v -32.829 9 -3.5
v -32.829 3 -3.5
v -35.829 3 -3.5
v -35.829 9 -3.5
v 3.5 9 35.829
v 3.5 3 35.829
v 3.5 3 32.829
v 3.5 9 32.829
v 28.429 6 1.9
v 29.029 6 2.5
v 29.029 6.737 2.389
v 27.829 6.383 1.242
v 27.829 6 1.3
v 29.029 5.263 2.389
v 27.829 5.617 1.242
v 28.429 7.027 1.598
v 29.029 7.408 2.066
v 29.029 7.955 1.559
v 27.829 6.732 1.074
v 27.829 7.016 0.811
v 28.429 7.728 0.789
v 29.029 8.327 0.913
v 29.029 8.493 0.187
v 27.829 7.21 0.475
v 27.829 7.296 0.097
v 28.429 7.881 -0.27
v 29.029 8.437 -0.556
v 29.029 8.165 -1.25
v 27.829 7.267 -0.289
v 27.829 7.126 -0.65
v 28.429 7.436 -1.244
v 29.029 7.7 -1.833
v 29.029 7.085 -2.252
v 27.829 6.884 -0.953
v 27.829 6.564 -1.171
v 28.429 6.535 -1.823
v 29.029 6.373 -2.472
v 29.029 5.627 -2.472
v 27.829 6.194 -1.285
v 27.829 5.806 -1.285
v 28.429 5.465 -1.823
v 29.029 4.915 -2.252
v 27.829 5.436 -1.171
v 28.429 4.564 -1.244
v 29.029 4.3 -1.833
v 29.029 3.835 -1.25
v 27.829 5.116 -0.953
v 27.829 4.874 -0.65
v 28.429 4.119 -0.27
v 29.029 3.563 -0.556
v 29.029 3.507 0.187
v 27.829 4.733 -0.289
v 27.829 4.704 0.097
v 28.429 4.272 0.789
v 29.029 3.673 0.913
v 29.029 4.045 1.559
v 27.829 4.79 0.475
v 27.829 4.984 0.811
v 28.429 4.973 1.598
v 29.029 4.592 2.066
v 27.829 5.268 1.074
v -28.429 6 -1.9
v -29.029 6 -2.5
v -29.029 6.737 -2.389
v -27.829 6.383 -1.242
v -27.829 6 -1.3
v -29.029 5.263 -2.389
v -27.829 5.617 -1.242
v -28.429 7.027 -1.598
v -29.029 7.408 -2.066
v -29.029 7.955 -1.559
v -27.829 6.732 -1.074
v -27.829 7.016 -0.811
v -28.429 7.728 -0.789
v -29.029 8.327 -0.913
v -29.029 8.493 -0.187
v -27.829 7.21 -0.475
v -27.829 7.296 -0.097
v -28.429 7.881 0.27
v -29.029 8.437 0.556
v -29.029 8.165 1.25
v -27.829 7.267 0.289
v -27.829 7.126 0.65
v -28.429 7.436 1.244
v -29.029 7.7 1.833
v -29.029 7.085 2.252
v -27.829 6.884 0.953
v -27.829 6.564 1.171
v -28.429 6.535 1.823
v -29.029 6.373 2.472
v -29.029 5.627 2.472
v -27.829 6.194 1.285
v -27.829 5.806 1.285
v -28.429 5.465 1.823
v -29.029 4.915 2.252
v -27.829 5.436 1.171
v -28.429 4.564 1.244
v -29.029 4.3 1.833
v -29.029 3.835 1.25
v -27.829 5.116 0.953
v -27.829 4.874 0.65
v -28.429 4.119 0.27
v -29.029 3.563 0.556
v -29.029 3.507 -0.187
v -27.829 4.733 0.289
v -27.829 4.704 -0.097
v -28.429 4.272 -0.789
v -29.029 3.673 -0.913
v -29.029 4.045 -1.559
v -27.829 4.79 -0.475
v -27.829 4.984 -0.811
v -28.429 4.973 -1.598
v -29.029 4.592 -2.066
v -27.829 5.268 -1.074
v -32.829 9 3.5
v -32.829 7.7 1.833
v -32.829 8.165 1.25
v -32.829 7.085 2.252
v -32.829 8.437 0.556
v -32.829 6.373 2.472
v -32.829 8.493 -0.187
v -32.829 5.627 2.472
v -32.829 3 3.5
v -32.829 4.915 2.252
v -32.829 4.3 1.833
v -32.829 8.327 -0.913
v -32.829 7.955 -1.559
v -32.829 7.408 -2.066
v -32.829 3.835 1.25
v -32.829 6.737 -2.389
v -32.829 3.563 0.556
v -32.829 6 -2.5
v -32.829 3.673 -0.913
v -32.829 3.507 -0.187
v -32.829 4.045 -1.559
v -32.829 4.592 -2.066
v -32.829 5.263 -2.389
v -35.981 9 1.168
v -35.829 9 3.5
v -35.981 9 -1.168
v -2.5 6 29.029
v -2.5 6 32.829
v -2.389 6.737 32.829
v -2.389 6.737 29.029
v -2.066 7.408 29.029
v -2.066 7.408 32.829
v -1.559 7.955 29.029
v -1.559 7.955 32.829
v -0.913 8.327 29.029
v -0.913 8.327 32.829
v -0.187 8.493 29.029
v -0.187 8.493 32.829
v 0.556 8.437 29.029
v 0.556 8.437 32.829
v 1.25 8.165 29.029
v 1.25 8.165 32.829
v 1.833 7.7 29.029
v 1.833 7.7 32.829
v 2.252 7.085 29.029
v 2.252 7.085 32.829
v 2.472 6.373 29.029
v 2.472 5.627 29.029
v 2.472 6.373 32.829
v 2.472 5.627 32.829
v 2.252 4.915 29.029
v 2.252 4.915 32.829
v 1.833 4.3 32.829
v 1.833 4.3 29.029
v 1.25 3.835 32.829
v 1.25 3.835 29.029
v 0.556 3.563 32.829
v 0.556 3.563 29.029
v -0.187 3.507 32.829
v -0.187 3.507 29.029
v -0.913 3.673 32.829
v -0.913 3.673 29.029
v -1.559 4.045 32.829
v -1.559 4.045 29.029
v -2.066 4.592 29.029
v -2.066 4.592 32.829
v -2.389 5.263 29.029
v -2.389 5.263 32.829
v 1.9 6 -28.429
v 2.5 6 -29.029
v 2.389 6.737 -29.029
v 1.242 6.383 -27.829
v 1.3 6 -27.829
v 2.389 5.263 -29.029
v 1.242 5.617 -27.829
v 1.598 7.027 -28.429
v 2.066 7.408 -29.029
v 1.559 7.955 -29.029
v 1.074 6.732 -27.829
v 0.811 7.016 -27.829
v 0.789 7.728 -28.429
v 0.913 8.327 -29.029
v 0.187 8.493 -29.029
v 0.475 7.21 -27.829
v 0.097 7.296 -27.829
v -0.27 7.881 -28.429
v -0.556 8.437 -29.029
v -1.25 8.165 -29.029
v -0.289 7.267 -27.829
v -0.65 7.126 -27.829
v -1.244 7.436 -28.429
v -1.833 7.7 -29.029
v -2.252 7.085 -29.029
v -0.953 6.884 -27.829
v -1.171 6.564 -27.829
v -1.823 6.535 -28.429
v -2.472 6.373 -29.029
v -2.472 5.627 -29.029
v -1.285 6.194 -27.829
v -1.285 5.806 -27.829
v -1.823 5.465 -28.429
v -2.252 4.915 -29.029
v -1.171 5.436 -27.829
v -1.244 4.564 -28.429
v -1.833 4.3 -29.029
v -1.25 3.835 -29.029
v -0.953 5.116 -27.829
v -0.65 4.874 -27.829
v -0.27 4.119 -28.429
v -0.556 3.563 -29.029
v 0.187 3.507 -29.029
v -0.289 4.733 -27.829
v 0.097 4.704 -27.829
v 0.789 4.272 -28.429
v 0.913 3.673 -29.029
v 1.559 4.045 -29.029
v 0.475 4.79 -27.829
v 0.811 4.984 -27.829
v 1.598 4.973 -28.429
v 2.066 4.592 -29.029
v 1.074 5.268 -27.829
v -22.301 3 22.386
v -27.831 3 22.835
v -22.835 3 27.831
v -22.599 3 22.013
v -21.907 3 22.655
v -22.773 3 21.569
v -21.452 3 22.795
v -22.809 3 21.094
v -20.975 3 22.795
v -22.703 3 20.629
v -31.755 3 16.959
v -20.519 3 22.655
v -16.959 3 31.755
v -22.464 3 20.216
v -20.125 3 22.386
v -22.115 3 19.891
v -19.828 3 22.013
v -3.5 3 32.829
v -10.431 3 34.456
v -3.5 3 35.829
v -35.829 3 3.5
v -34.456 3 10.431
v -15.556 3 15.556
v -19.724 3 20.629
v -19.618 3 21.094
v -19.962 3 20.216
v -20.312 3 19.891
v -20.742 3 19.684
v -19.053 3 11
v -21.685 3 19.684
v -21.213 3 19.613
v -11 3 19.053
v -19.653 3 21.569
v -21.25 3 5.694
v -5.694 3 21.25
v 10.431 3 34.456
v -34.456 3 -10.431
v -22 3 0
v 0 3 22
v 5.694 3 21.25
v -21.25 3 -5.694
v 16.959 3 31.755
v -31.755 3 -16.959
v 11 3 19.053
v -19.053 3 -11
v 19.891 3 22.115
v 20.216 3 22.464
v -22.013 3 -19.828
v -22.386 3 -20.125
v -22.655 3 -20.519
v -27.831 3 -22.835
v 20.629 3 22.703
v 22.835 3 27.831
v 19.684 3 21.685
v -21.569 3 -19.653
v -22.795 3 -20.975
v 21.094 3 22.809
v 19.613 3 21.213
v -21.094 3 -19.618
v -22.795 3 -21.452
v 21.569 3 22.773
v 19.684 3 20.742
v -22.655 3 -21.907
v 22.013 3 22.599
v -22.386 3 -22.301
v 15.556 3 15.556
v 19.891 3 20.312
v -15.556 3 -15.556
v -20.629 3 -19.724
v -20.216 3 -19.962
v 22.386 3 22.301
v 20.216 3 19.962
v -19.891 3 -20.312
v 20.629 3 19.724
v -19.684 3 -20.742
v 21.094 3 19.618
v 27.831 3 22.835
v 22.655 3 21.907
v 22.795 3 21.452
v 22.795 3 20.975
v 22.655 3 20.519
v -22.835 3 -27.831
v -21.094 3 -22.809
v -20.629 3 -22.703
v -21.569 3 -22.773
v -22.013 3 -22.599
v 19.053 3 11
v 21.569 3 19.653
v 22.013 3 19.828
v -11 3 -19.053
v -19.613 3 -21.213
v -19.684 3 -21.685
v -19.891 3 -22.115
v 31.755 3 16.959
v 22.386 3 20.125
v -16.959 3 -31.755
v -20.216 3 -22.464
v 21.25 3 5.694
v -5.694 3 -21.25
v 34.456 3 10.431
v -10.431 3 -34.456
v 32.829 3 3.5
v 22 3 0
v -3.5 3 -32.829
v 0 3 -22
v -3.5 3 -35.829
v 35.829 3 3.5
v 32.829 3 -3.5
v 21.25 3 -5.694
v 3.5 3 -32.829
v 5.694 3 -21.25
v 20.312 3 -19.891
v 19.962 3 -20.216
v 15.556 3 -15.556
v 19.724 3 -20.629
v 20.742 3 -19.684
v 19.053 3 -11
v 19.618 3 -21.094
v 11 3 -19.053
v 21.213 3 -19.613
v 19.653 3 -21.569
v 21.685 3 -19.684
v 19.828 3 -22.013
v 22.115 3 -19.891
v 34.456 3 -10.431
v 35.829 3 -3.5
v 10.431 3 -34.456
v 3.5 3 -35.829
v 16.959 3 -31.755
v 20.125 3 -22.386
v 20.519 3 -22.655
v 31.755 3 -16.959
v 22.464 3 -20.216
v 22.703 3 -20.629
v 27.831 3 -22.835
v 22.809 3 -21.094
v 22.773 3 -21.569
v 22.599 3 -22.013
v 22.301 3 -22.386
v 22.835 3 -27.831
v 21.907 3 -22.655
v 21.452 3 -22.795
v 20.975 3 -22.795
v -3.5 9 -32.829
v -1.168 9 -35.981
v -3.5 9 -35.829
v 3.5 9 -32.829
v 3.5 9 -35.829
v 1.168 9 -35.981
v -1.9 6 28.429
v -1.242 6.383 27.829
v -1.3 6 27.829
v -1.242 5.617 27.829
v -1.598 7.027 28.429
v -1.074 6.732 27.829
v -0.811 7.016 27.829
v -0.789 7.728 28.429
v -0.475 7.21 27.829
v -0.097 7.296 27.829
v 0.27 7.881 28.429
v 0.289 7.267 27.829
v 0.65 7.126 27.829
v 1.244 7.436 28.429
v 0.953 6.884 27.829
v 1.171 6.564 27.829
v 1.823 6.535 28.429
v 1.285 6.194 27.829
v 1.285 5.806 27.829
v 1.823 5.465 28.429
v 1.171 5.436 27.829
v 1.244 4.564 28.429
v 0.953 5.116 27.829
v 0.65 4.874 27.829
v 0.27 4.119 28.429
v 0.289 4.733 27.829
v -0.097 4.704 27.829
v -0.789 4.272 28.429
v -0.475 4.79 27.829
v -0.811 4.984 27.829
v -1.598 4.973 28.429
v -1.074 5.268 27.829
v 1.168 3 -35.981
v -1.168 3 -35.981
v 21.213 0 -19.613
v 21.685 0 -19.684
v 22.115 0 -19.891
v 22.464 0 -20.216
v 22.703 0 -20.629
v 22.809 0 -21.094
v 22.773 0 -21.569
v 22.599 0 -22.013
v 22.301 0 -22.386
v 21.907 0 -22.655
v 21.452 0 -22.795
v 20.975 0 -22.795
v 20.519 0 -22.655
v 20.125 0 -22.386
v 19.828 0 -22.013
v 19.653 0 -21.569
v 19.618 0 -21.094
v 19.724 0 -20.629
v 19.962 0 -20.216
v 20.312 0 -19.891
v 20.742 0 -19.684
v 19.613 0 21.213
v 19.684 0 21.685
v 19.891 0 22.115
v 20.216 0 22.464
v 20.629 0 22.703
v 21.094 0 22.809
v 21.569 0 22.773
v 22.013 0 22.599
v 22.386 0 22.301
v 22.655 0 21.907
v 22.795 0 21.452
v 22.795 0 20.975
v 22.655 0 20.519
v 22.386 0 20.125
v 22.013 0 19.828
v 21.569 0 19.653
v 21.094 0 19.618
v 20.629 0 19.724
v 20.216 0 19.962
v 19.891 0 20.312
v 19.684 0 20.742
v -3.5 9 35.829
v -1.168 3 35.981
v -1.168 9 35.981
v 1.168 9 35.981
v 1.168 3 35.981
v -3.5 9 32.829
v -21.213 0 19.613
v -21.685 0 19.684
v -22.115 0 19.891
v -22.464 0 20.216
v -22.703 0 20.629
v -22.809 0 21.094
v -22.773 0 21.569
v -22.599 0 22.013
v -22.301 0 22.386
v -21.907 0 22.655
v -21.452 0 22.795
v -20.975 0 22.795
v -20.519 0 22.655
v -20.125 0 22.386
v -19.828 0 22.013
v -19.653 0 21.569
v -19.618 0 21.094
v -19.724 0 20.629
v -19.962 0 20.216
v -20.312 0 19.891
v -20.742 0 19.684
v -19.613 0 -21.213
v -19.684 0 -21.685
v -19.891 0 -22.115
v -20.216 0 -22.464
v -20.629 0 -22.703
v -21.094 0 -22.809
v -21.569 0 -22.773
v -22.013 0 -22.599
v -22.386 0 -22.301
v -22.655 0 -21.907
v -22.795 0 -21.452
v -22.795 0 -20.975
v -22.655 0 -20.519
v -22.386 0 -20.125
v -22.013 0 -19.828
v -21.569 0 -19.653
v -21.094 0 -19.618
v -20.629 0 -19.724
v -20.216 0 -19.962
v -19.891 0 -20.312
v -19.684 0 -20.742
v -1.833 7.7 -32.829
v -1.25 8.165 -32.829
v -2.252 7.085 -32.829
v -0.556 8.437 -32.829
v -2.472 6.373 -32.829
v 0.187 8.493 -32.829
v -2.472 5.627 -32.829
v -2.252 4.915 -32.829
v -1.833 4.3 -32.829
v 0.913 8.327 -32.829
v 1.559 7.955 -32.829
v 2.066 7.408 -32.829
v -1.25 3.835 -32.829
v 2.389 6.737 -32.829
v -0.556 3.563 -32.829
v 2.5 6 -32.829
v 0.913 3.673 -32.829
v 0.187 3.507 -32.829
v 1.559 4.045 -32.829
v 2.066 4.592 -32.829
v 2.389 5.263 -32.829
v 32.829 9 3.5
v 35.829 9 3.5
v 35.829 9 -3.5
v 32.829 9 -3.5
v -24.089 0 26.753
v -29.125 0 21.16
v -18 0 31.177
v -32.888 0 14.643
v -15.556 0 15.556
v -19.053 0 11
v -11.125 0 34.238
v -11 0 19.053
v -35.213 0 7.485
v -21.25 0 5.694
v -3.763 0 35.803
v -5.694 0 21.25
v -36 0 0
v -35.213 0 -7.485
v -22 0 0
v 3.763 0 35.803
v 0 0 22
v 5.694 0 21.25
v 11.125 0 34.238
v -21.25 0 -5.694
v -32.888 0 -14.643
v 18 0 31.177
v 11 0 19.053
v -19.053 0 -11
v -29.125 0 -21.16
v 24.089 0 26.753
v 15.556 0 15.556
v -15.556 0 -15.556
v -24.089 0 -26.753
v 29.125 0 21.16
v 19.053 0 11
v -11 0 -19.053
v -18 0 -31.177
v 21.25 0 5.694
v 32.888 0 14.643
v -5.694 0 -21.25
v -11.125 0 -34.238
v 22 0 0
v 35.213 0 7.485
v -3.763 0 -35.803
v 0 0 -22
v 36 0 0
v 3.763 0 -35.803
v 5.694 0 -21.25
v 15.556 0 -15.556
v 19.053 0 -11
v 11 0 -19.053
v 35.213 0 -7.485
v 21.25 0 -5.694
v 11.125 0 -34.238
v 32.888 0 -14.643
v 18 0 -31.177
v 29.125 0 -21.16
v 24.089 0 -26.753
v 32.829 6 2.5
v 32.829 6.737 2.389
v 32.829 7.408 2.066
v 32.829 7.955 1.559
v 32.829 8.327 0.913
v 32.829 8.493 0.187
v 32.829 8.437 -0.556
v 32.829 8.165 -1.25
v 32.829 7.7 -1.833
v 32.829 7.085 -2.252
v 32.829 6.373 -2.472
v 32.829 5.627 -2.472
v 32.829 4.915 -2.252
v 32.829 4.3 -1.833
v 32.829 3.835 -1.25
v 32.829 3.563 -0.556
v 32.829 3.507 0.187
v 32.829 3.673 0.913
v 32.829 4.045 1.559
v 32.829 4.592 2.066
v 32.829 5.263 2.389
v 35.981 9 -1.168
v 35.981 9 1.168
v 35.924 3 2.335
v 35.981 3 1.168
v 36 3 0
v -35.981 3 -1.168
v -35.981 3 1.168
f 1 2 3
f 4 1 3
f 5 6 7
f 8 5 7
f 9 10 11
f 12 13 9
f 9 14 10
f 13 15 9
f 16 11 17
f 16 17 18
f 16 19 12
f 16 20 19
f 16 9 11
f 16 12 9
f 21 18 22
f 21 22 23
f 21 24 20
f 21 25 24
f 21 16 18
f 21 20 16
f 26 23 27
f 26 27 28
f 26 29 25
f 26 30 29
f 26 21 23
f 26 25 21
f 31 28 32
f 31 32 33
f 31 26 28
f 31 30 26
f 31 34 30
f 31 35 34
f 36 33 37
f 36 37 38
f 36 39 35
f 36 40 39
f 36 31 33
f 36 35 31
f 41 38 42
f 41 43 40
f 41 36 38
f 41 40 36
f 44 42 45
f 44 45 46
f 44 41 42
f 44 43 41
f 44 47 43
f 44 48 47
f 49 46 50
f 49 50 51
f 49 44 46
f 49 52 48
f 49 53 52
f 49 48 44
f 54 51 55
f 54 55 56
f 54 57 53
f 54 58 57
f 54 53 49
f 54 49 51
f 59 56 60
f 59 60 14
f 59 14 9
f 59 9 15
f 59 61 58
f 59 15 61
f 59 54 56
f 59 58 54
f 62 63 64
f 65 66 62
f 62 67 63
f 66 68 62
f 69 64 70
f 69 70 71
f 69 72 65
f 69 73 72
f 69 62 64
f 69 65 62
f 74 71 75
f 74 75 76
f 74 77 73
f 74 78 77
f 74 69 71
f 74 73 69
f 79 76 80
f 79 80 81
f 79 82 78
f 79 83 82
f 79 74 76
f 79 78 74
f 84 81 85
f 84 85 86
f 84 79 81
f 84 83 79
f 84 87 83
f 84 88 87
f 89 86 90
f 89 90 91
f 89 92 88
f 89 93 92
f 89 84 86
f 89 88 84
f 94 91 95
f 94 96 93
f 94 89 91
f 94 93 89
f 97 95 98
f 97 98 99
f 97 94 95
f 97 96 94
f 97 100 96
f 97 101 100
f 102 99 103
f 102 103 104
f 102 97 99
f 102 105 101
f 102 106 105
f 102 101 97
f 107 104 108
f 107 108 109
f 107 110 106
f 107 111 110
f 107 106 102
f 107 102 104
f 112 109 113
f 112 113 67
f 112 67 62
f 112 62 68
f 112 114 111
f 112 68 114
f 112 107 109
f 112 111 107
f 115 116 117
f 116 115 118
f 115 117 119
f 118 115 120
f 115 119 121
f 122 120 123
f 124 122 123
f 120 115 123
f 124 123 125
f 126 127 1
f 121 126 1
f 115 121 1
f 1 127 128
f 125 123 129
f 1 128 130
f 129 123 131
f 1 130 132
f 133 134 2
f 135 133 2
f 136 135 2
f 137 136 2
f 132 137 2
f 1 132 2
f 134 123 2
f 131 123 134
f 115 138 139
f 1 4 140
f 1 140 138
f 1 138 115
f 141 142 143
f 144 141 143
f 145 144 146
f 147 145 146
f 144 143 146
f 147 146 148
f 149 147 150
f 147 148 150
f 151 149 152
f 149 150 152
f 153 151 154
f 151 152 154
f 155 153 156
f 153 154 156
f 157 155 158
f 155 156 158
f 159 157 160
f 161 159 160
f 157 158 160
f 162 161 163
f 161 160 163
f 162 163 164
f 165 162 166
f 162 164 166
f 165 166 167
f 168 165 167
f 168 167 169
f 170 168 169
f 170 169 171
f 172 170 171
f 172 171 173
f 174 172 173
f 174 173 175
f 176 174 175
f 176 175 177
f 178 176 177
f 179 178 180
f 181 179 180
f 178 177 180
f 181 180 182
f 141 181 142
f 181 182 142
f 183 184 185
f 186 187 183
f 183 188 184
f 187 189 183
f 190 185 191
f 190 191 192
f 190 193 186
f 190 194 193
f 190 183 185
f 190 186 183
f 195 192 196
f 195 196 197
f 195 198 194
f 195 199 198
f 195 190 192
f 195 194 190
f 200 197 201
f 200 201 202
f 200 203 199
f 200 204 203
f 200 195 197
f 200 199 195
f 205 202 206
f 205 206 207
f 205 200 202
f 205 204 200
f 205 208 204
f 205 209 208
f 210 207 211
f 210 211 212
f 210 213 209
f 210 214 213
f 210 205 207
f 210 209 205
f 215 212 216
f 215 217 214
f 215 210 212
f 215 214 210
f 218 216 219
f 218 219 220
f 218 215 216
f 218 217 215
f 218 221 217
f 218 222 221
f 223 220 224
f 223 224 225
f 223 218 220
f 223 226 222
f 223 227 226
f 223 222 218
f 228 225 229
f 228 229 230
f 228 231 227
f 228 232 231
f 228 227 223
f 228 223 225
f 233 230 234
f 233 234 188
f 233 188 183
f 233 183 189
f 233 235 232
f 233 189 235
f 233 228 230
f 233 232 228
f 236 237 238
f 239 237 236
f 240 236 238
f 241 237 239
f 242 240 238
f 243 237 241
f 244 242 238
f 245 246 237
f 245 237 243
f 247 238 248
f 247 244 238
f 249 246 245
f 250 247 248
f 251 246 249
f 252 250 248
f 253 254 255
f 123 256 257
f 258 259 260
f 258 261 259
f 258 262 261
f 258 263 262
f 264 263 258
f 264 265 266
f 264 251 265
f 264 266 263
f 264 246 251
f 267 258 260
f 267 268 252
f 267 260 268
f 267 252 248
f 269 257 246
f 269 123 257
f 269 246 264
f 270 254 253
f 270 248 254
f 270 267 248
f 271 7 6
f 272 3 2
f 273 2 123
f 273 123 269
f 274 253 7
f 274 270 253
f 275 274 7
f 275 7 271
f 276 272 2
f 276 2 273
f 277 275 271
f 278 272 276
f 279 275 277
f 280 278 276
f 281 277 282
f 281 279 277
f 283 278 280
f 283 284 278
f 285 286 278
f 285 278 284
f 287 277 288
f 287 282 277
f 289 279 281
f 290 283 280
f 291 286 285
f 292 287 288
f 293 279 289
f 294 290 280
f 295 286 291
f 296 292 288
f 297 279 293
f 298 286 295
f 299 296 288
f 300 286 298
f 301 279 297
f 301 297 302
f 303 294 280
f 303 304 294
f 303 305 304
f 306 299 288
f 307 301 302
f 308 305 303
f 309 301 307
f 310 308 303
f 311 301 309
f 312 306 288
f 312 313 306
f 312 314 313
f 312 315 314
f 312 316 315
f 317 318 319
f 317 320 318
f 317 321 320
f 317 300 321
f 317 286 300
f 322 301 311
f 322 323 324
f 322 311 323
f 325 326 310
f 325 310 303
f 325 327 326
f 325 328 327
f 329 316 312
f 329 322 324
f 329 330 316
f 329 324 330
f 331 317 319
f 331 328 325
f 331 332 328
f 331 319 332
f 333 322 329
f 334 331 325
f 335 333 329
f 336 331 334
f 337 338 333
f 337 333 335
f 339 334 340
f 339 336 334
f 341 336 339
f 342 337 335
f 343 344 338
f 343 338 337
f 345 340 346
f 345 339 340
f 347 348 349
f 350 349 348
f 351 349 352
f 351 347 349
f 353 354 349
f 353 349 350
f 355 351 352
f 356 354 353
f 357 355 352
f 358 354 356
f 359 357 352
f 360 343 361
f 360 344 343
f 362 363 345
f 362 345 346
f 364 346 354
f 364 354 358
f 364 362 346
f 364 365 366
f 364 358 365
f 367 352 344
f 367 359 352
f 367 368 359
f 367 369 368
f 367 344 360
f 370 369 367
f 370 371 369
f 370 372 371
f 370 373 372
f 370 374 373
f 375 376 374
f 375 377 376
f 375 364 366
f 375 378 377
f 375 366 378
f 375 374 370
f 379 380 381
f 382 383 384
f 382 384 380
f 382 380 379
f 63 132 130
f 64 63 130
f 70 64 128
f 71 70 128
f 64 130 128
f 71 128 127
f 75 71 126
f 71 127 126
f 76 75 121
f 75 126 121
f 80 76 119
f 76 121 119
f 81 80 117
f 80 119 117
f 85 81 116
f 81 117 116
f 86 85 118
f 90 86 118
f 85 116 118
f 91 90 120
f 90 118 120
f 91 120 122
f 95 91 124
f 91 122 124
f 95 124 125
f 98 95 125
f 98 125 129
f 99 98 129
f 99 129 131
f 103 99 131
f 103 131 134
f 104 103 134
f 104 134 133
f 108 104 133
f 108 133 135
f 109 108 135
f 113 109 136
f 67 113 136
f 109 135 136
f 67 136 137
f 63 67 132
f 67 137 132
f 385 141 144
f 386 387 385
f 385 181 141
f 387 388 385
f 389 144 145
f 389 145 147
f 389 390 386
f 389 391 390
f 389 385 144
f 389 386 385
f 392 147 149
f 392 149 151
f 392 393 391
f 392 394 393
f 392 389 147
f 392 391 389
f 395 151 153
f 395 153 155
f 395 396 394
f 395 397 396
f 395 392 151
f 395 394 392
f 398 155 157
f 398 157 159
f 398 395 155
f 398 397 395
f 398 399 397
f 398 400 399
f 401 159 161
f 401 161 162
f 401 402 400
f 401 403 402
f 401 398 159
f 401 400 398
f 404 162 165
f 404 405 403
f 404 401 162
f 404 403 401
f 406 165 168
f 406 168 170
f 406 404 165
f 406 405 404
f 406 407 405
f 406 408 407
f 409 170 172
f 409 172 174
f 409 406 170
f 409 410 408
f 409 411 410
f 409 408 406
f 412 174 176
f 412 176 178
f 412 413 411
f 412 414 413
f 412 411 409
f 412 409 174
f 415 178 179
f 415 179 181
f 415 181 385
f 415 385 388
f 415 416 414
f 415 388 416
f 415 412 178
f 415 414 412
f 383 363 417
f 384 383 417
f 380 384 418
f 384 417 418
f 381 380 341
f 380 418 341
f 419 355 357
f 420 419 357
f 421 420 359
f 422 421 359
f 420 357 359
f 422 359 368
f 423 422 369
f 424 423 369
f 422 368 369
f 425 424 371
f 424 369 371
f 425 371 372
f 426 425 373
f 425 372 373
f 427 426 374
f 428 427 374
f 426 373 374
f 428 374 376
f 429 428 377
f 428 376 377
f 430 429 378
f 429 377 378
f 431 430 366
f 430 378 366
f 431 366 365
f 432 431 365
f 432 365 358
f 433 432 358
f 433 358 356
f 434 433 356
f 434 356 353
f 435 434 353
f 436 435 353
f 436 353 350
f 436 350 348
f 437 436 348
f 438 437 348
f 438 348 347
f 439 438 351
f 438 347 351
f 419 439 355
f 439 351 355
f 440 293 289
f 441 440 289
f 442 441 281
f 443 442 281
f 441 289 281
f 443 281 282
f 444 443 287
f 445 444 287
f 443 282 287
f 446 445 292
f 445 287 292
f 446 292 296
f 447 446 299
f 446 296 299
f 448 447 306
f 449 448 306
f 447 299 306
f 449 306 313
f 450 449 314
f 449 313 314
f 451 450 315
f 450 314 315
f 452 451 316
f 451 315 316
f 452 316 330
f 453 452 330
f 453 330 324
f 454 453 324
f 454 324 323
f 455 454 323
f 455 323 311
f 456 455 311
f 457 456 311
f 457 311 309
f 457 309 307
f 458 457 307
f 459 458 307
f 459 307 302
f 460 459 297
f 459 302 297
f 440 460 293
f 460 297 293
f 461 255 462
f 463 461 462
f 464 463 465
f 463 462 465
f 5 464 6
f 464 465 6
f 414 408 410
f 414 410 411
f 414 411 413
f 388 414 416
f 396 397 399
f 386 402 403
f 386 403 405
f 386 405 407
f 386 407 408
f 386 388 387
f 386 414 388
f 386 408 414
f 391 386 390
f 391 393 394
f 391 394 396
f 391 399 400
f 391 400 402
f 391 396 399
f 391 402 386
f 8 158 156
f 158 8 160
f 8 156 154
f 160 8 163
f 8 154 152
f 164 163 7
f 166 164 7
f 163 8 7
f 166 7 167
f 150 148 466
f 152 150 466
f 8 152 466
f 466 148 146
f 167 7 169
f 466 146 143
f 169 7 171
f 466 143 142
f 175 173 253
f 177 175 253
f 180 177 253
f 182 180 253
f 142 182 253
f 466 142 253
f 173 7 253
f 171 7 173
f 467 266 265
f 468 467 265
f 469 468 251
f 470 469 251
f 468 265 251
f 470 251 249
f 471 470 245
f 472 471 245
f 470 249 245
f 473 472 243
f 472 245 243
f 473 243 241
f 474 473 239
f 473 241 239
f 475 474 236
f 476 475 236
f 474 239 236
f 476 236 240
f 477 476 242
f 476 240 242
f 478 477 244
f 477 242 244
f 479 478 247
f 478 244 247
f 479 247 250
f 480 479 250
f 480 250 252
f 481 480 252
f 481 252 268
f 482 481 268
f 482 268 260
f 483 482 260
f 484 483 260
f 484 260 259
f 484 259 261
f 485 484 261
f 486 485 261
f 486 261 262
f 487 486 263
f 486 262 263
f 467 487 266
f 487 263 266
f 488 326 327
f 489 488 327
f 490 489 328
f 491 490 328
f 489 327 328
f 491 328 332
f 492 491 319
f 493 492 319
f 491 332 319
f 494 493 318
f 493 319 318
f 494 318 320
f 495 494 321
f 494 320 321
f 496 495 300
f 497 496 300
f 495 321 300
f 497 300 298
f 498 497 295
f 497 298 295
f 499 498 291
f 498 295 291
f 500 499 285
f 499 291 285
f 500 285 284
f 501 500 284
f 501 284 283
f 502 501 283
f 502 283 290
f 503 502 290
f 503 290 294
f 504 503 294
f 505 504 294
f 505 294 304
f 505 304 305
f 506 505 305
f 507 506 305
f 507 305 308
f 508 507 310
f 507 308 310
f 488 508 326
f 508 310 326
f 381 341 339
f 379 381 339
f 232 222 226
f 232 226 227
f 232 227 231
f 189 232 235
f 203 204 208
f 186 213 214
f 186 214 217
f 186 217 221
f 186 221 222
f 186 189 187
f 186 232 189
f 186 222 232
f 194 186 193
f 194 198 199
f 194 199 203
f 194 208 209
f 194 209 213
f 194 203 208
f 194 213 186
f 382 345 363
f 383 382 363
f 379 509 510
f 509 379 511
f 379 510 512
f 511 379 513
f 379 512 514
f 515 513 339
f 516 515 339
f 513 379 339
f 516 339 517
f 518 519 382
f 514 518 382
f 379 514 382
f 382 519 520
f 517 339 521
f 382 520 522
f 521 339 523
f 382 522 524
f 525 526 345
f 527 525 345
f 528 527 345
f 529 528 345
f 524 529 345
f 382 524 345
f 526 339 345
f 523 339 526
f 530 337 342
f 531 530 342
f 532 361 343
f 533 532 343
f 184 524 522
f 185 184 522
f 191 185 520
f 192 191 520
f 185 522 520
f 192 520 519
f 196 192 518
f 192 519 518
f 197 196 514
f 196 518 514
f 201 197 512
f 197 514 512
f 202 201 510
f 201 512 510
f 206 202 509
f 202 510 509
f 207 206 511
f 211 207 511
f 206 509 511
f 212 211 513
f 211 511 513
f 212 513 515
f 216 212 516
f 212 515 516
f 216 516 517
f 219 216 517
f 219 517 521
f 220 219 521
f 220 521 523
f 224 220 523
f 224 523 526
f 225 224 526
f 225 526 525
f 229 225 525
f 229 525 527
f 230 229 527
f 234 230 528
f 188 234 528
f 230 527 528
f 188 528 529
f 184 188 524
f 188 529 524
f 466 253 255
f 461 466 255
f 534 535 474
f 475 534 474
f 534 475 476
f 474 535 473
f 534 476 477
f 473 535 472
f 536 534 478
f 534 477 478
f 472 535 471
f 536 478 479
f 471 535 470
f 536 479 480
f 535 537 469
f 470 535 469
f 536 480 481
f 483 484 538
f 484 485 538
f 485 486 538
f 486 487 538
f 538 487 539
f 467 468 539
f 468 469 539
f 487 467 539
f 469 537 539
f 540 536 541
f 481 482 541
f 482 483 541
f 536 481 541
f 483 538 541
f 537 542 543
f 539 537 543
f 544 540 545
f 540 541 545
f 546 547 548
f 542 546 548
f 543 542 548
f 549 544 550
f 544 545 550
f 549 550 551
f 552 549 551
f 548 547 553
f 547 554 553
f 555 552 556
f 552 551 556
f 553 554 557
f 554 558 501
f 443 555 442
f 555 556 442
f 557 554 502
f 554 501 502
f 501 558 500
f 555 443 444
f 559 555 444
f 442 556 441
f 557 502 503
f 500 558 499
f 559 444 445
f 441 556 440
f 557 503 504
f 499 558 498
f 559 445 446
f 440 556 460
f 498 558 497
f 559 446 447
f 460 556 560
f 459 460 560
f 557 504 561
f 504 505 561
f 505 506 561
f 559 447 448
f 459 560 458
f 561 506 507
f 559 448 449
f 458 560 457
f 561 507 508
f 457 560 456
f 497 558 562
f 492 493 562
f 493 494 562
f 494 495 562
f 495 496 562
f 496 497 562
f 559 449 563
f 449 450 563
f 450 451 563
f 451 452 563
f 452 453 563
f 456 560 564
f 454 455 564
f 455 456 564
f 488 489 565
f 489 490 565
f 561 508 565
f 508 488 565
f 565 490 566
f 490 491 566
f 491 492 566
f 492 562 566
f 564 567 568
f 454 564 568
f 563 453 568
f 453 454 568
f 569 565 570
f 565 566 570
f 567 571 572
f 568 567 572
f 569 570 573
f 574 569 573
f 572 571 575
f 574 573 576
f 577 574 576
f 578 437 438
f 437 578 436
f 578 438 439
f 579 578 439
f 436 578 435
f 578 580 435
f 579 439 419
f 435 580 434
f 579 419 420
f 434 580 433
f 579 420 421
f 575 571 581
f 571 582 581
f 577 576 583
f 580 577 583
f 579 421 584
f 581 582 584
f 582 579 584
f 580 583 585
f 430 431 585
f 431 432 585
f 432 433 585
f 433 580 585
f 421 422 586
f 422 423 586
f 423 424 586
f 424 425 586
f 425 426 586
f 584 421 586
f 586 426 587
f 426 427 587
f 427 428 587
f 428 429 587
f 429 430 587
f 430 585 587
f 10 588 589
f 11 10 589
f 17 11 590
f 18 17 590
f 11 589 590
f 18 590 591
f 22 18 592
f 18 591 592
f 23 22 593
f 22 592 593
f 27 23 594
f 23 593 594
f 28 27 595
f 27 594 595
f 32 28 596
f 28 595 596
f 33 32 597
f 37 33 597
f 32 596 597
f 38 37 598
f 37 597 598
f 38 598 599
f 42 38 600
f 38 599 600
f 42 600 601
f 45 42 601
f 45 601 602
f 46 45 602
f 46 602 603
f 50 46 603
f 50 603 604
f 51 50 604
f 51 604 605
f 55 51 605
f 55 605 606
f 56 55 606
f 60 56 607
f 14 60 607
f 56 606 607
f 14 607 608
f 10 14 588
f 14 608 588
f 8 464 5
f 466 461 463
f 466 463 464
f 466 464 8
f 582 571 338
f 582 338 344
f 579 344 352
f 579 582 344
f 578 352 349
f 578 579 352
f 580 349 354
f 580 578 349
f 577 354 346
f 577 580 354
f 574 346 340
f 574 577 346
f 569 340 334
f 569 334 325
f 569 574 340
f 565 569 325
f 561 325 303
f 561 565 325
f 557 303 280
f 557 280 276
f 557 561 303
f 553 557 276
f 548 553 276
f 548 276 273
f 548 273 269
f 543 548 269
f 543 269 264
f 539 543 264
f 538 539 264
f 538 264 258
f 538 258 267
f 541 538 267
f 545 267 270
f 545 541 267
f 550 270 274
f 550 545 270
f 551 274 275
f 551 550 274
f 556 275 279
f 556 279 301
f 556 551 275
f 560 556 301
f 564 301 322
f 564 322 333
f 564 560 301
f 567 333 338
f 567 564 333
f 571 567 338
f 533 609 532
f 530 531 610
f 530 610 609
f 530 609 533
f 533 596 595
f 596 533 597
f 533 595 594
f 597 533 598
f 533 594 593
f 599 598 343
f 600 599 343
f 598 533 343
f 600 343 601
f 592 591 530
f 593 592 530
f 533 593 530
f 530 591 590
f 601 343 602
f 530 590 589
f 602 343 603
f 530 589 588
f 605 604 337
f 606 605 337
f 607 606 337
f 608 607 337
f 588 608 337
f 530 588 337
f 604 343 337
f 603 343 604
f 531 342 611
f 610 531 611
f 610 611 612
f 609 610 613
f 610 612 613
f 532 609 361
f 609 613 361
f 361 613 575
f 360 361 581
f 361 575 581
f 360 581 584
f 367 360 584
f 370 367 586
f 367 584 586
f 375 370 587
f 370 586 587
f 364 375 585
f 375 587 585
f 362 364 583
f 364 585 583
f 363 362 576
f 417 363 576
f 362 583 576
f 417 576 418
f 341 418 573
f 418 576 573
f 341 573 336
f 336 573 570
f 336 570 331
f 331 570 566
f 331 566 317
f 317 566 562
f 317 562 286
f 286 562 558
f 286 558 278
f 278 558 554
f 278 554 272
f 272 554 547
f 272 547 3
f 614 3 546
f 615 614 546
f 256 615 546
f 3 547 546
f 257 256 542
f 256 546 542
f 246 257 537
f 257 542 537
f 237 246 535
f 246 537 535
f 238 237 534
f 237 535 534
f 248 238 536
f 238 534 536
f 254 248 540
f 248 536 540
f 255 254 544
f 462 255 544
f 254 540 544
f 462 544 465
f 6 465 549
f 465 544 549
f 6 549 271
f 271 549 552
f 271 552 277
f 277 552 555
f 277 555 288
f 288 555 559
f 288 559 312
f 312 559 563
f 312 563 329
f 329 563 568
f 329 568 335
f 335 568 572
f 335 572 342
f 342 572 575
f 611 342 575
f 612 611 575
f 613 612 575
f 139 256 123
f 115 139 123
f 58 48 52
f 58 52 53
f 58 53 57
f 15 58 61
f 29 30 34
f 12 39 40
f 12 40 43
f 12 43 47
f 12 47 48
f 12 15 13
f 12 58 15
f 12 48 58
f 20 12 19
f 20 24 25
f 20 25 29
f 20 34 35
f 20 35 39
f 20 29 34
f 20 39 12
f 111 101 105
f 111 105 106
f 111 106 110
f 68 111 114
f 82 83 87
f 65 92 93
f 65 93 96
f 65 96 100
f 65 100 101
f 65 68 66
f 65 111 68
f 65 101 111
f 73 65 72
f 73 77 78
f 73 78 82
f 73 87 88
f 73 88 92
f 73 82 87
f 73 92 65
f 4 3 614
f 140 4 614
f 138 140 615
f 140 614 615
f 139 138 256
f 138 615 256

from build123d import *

# Parameters (mm, degrees)
SKETCH1_R                    = 36
SKETCH1_R_2                  = 22
BOSS_EXTRUDE1_DEPTH          = 3
BOSS_EXTRUDE2_DEPTH          = 6
SKETCH3_R                    = 2.5
BOSS_EXTRUDE3_DEPTH          = 5
CHAMFER1_SIZE                = 1.2
CIRPATTERN1_COUNT            = 4
CHAMFER1_OF_CIRPATTERN1_SIZE = 1.2
SKETCH4_R                    = 1.6
CUT_EXTRUDE1_DEPTH           = 3
CIRPATTERN2_COUNT            = 4


with BuildPart() as part:
    # Sketch1 → Boss-Extrude1 (new body)
    with BuildSketch(Plane(origin=(0, 0, 0), x_dir=(1, 0, 0), z_dir=(0, 1, 0))):
        Circle(SKETCH1_R)
        Circle(SKETCH1_R_2, mode=Mode.SUBTRACT)
    extrude(amount=BOSS_EXTRUDE1_DEPTH)

    # Sketch2 → Boss-Extrude2 (add)
    with BuildSketch(Plane(origin=(0, 3, 0), x_dir=(1, 0, 0), z_dir=(0, 1, 0))):
        with BuildLine():
            Line((-32.829457155, 3.5), (-35.829457155, 3.5))
            ThreePointArc((-35.829457155, 3.5), (-36, 0), (-35.829457155, -3.5))
            Line((-35.829457155, -3.5), (-32.829457155, -3.5))
            Line((-32.829457155, -3.5), (-32.829457155, 3.5))
        make_face()
    boss_extrude2 = extrude(amount=BOSS_EXTRUDE2_DEPTH)

    # Sketch3 → Boss-Extrude3 (add)
    with BuildSketch(Plane(origin=(-32.829457155, 0, 0), x_dir=(0, 0, -1), z_dir=(1, 0, 0))):
        with Locations((0, 6)):
            Circle(SKETCH3_R)
    boss_extrude3 = extrude(amount=BOSS_EXTRUDE3_DEPTH)

    # Chamfer1
    chamfer1_edges = [part.edges().sort_by_distance(p)[0] for p in [
        (-27.829457155, 6, 2.5),
    ]]
    chamfer(chamfer1_edges, length=CHAMFER1_SIZE)

    # CirPattern1: Boss-Extrude2, Boss-Extrude3 ×4 about axis
    cirpattern1_axis = Axis((0, 0, 0), (0, 1, 0))
    for i in range(1, CIRPATTERN1_COUNT):
        add(boss_extrude2.rotate(cirpattern1_axis, i * 360 / CIRPATTERN1_COUNT))
        add(boss_extrude3.rotate(cirpattern1_axis, i * 360 / CIRPATTERN1_COUNT))

    # Chamfer1 of CirPattern1
    chamfer1_of_cirpattern1_edges = [part.edges().sort_by_distance(p)[0] for p in [
        (2.5, 6, 27.829457155),
        (27.829457155, 6, -2.5),
        (-2.5, 6, -27.829457155),
    ]]
    chamfer(chamfer1_of_cirpattern1_edges, length=CHAMFER1_OF_CIRPATTERN1_SIZE)

    # Sketch4 → Cut-Extrude1 (cut)
    with BuildSketch(Plane(origin=(0, 3, 0), x_dir=(1, 0, 0), z_dir=(0, 1, 0))):
        with Locations((-21.213203436, 21.213203436)):
            Circle(SKETCH4_R)
    cut_extrude1 = extrude(amount=-CUT_EXTRUDE1_DEPTH, mode=Mode.SUBTRACT)

    # CirPattern2: Cut-Extrude1 ×4 about axis
    cirpattern2_axis = Axis((0, 0, 0), (0, 1, 0))
    for i in range(1, CIRPATTERN2_COUNT):
        add(cut_extrude1.rotate(cirpattern2_axis, i * 360 / CIRPATTERN2_COUNT), mode=Mode.SUBTRACT)


solid = part.part
